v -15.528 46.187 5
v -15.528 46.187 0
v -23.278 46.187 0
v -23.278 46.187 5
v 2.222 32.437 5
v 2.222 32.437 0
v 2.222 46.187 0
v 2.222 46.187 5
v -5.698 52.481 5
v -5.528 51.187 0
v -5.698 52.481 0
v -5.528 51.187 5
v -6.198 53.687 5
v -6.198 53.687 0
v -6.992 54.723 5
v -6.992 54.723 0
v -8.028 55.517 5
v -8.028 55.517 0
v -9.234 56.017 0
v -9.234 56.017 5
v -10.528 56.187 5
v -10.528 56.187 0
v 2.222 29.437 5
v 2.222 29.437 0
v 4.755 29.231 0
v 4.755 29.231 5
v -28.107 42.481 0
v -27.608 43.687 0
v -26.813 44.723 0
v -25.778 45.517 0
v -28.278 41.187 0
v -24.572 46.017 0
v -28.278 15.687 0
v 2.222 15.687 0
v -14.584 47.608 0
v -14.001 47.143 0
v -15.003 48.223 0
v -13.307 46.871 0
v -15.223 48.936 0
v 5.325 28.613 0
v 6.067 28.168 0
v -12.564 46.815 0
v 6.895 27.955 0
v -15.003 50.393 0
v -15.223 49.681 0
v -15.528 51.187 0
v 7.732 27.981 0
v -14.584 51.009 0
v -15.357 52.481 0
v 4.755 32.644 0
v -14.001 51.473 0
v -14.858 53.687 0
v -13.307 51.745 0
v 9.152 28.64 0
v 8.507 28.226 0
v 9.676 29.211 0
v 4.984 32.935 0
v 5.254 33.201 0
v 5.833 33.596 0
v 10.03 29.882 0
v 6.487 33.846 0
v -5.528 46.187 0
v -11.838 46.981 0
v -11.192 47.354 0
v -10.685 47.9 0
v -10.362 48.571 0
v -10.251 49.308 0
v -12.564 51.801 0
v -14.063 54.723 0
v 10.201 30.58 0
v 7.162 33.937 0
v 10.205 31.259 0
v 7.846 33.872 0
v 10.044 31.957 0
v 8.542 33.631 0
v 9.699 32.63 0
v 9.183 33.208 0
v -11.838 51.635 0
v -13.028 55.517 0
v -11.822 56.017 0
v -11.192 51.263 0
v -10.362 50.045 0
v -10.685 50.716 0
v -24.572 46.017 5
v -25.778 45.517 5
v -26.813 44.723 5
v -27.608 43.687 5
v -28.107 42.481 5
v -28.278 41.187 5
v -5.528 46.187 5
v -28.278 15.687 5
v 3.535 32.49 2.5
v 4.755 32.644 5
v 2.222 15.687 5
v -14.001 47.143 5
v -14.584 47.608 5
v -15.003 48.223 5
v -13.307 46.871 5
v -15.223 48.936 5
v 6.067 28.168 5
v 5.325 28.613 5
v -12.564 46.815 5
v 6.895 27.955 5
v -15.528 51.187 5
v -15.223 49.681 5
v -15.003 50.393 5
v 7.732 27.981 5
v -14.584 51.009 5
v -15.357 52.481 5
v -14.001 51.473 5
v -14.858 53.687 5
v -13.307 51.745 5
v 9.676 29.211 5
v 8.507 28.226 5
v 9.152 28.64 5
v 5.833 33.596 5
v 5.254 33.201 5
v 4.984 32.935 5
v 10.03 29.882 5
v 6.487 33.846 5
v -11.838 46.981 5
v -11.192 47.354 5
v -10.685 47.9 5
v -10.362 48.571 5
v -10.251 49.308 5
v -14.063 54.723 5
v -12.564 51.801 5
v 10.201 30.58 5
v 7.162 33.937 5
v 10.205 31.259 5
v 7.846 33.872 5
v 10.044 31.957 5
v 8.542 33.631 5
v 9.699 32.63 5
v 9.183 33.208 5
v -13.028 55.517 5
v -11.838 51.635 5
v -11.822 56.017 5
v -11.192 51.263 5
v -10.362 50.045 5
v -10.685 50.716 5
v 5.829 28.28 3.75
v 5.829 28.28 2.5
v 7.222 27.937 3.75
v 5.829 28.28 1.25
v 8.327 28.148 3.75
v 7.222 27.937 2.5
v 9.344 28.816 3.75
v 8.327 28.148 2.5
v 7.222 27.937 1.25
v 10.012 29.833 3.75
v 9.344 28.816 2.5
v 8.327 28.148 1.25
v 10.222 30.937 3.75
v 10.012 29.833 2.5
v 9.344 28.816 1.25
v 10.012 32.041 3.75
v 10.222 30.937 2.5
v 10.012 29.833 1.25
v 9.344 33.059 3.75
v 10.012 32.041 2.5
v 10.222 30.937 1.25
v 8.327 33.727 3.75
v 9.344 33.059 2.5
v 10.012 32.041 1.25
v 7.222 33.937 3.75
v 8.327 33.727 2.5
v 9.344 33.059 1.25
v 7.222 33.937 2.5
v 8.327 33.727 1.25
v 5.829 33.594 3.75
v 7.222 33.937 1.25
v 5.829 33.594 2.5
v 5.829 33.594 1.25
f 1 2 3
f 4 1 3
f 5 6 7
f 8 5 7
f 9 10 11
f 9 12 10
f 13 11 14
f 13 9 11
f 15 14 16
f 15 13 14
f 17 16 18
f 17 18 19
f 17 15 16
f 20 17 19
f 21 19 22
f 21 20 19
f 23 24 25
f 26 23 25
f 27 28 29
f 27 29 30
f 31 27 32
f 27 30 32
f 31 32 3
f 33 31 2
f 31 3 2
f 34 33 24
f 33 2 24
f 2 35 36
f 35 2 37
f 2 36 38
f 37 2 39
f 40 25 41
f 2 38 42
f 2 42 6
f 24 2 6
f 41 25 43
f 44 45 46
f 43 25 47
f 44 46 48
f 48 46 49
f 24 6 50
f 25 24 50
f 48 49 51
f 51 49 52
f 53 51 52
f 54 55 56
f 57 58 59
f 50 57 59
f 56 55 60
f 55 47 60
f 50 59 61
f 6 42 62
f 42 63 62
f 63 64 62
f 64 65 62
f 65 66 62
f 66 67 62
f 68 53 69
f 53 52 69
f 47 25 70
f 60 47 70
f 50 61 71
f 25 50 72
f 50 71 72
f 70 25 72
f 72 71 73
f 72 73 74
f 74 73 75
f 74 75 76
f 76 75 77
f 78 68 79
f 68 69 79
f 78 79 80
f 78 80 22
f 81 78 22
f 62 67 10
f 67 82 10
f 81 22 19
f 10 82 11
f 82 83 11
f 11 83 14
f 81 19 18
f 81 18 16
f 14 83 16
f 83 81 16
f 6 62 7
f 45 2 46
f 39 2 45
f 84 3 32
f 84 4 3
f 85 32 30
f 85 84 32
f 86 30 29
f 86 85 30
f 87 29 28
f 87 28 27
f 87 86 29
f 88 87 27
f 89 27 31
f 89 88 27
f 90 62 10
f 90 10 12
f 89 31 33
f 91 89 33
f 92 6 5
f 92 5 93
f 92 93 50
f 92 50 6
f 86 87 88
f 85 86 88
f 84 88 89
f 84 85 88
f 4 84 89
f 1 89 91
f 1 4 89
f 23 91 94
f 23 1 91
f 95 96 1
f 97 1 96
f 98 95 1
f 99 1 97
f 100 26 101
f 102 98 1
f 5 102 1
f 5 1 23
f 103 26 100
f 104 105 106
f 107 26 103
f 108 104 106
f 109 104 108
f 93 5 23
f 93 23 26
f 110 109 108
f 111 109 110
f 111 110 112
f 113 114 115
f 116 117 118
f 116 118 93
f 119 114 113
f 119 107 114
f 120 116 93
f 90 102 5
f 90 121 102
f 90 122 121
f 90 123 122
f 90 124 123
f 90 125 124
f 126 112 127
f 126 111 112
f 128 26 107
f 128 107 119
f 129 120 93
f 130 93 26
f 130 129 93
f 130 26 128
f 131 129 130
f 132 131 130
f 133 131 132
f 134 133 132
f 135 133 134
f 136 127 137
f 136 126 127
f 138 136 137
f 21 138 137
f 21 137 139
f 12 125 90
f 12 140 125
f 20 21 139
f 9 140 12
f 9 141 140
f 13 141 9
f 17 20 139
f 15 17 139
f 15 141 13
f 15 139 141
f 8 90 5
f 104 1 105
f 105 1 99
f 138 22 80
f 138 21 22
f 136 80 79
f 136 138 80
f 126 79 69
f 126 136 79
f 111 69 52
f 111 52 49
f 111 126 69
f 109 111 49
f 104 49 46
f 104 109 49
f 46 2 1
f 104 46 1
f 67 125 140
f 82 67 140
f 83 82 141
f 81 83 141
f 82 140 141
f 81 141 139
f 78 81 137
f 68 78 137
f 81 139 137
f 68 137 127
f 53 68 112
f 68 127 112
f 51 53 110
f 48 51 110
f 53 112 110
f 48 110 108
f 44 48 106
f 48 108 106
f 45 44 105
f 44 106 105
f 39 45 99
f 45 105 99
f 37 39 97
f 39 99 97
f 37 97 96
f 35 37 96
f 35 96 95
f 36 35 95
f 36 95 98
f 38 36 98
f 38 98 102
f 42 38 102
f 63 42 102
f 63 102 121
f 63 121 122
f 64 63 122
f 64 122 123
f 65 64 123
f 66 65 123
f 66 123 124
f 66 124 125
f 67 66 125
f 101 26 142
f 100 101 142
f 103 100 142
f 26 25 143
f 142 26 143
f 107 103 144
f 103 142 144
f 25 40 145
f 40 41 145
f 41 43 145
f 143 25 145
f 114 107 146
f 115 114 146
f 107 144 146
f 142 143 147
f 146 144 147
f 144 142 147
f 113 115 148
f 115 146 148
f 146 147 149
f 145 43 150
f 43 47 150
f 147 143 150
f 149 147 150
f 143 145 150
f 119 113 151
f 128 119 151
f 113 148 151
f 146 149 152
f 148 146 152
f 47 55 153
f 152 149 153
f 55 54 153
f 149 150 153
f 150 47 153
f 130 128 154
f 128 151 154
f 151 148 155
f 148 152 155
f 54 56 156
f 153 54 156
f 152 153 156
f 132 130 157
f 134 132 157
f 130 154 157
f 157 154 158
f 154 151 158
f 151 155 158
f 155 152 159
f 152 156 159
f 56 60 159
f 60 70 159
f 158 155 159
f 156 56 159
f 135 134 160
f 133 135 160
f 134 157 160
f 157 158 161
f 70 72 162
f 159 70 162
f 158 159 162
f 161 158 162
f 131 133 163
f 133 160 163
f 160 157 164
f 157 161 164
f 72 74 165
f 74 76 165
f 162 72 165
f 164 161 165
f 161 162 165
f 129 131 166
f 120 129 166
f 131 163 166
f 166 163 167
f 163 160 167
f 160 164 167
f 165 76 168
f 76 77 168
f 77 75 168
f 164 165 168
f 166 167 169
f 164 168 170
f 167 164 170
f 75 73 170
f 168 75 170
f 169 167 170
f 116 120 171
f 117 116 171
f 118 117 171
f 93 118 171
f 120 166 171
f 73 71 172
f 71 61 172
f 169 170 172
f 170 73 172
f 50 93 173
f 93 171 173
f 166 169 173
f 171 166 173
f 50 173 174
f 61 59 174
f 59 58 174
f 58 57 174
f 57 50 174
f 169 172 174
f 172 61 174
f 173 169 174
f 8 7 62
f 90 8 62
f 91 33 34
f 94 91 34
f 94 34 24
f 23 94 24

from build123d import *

# Parameters (mm, degrees)
F1_DEPTH = 5
F2_R     = 5
F3_W     = 5
F3_H     = 5
F4_DEPTH = 10
F5_R     = 4.99999
F6_R     = 2.5
F7_DEPTH = 25


# Not quite as in the source:
# - a fillet or chamfer is up to 0.001 mm smaller than in the source, because OpenCascade refuses the exact size


with BuildPart() as f1:
    # F0 (on Top) → F1 (new body)
    with BuildSketch(Plane.XY):
        with BuildLine():
            Line((2.2222189992, 32.4371969399), (2.2222189992, 33.9371969399))
            Line((2.2222189992, 33.9371969399), (2.2222189992, 35.4371969399))
            add(Edge.make_bspline(
                [(2.2222189992, 35.4371969399), (-2.7777810008, 35.4371969399), (-2.7777810008, 33.9371969399), (-2.7777810008, 32.4371969399), (2.2222189992, 32.4371969399)],
                knots=[1.5707963268, 1.5707963268, 1.5707963268, 3.1415926536, 3.1415926536, 4.7123889804, 4.7123889804, 4.7123889804], degree=2, weights=[1, 0.7071067812, 1, 0.7071067812, 1]))
        make_face()
        with BuildLine():
            add(Edge.make_bspline(
                [(2.2222189992, 32.4371969399), (3.5823095151, 32.4371969399), (4.7549905191, 32.6438848513)],
                knots=[4.7123889804, 4.7123889804, 4.7123889804, 5.2435726948, 5.2435726948, 5.2435726948], degree=2, weights=[1, 0.964937319, 1]))
            Line((2.2222189992, 32.4371969399), (2.2222189992, 30.9371969399))
            Line((2.2222189992, 30.9371969399), (4.2222189992, 30.9371969399))
            add(Edge.make_bspline(
                [(4.7549905191, 32.6438848513), (4.2222189992, 31.8736977196), (4.2222189992, 30.9371969399)],
                knots=[0.9656335287, 0.9656335287, 0.9656335287, 1.5707963268, 1.5707963268, 1.5707963268], degree=2, weights=[1, 0.9545704514, 1]))
        make_face()
        with BuildLine():
            Line((2.2222189992, 30.9371969399), (2.2222189992, 32.4371969399))
            add(Edge.make_bspline(
                [(2.2222189992, 35.4371969399), (-2.7777810008, 35.4371969399), (-2.7777810008, 33.9371969399), (-2.7777810008, 32.4371969399), (2.2222189992, 32.4371969399)],
                knots=[1.5707963268, 1.5707963268, 1.5707963268, 3.1415926536, 3.1415926536, 4.7123889804, 4.7123889804, 4.7123889804], degree=2, weights=[1, 0.7071067812, 1, 0.7071067812, 1]))
            Line((2.2222189992, 35.4371969399), (2.2222189992, 46.1871969399))
            Line((2.2222189992, 46.1871969399), (-28.2777810008, 46.1871969399))
            Line((-28.2777810008, 46.1871969399), (-28.2777810008, 15.6871969399))
            Line((-28.2777810008, 15.6871969399), (2.2222189992, 15.6871969399))
            Line((2.2222189992, 15.6871969399), (2.2222189992, 26.4371969399))
            add(Edge.make_bspline(
                [(2.2222189992, 29.4371969399), (-2.7777810008, 29.4371969399), (-2.7777810008, 27.9371969399), (-2.7777810008, 26.4371969399), (2.2222189992, 26.4371969399)],
                knots=[4.7123889804, 4.7123889804, 4.7123889804, 6.2831853072, 6.2831853072, 7.853981634, 7.853981634, 7.853981634], degree=2, weights=[1, 0.7071067812, 1, 0.7071067812, 1]))
            Line((2.2222189992, 29.4371969399), (2.2222189992, 30.9371969399))
        make_face()
        with BuildLine():
            Line((4.2222189992, 30.9371969399), (2.2222189992, 30.9371969399))
            Line((2.2222189992, 30.9371969399), (2.2222189992, 29.4371969399))
            add(Edge.make_bspline(
                [(4.7549905191, 29.2305090285), (3.5823095151, 29.4371969399), (2.2222189992, 29.4371969399)],
                knots=[4.181205266, 4.181205266, 4.181205266, 4.7123889804, 4.7123889804, 4.7123889804], degree=2, weights=[1, 0.964937319, 1]))
            add(Edge.make_bspline(
                [(4.2222189992, 30.9371969399), (4.2222189992, 30.0006961603), (4.7549905191, 29.2305090285)],
                knots=[1.5707963268, 1.5707963268, 1.5707963268, 2.1759591249, 2.1759591249, 2.1759591249], degree=2, weights=[1, 0.9545704514, 1]))
        make_face()
        with BuildLine():
            add(Edge.make_bspline(
                [(7.2222189992, 33.9371969399), (5.6496300407, 33.9371969399), (4.7549905191, 32.6438848513)],
                knots=[0, 0, 0, 0.9656335287, 0.9656335287, 0.9656335287], degree=2, weights=[1, 0.8856906826, 1]))
            add(Edge.make_bspline(
                [(4.7549905191, 32.6438848513), (7.2222189992, 33.0787399396), (7.2222189992, 33.9371969399)],
                knots=[5.2435726948, 5.2435726948, 5.2435726948, 6.2831853072, 6.2831853072, 6.2831853072], degree=2, weights=[1, 0.867915406, 1]))
        make_face()
        with BuildLine():
            add(Edge.make_bspline(
                [(4.7549905191, 32.6438848513), (7.2222189992, 33.0787399396), (7.2222189992, 33.9371969399)],
                knots=[5.2435726948, 5.2435726948, 5.2435726948, 6.2831853072, 6.2831853072, 6.2831853072], degree=2, weights=[1, 0.867915406, 1]))
            add(Edge.make_bspline(
                [(4.7549905191, 32.6438848513), (4.2222189992, 31.8736977196), (4.2222189992, 30.9371969399)],
                knots=[0.9656335287, 0.9656335287, 0.9656335287, 1.5707963268, 1.5707963268, 1.5707963268], degree=2, weights=[1, 0.9545704514, 1]))
            Line((4.2222189992, 30.9371969399), (7.2222189992, 30.9371969399))
            Line((7.2222189992, 30.9371969399), (7.2222189992, 33.9371969399))
        make_face()
        with BuildLine():
            add(Edge.make_bspline(
                [(7.2222189992, 27.9371969399), (10.2222189992, 27.9371969399), (10.2222189992, 30.9371969399), (10.2222189992, 33.9371969399), (7.2222189992, 33.9371969399)],
                knots=[3.1415926536, 3.1415926536, 3.1415926536, 4.7123889804, 4.7123889804, 6.2831853072, 6.2831853072, 6.2831853072], degree=2, weights=[1, 0.7071067812, 1, 0.7071067812, 1]))
            Line((7.2222189992, 33.9371969399), (7.2222189992, 30.9371969399))
            Line((7.2222189992, 30.9371969399), (7.2222189992, 27.9371969399))
        make_face()
        with BuildLine():
            Line((2.2222189992, 27.9371969399), (2.2222189992, 29.4371969399))
            add(Edge.make_bspline(
                [(2.2222189992, 29.4371969399), (-2.7777810008, 29.4371969399), (-2.7777810008, 27.9371969399), (-2.7777810008, 26.4371969399), (2.2222189992, 26.4371969399)],
                knots=[4.7123889804, 4.7123889804, 4.7123889804, 6.2831853072, 6.2831853072, 7.853981634, 7.853981634, 7.853981634], degree=2, weights=[1, 0.7071067812, 1, 0.7071067812, 1]))
            Line((2.2222189992, 26.4371969399), (2.2222189992, 27.9371969399))
        make_face()
        with BuildLine():
            Line((7.2222189992, 30.9371969399), (4.2222189992, 30.9371969399))
            add(Edge.make_bspline(
                [(4.2222189992, 30.9371969399), (4.2222189992, 30.0006961603), (4.7549905191, 29.2305090285)],
                knots=[1.5707963268, 1.5707963268, 1.5707963268, 2.1759591249, 2.1759591249, 2.1759591249], degree=2, weights=[1, 0.9545704514, 1]))
            add(Edge.make_bspline(
                [(7.2222189992, 27.9371969399), (7.2222189992, 28.7956539402), (4.7549905191, 29.2305090285)],
                knots=[3.1415926536, 3.1415926536, 3.1415926536, 4.181205266, 4.181205266, 4.181205266], degree=2, weights=[1, 0.867915406, 1]))
            Line((7.2222189992, 27.9371969399), (7.2222189992, 30.9371969399))
        make_face()
        with BuildLine():
            add(Edge.make_bspline(
                [(4.7549905191, 29.2305090285), (5.6496300407, 27.9371969399), (7.2222189992, 27.9371969399)],
                knots=[2.1759591249, 2.1759591249, 2.1759591249, 3.1415926536, 3.1415926536, 3.1415926536], degree=2, weights=[1, 0.8856906826, 1]))
            add(Edge.make_bspline(
                [(7.2222189992, 27.9371969399), (7.2222189992, 28.7956539402), (4.7549905191, 29.2305090285)],
                knots=[3.1415926536, 3.1415926536, 3.1415926536, 4.181205266, 4.181205266, 4.181205266], degree=2, weights=[1, 0.867915406, 1]))
        make_face()
    extrude(amount=F1_DEPTH)

    # F2
    f2_edges = [f1.edges().sort_by_distance(p)[0] for p in [
        (-28.277781, 46.187197, 2.5),
    ]]
    fillet(f2_edges, radius=F2_R)

    # F3 (on face) → F4 (join)
    with BuildSketch(Plane(origin=(0, 46.1871969399, 0), x_dir=(-1, 0, 0), z_dir=(0, 1, 0))):
        with Locations((13.0277810008, 2.5)):
            Rectangle(F3_W, F3_H)
        with Locations((8.0277810008, 2.5)):
            Rectangle(F3_W, F3_H)
    extrude(amount=F4_DEPTH)

    # F5 (radius 5 in the source; OpenCascade refuses exactly that, so slightly less here)
    f5_edges = [f1.edges().sort_by_distance(p)[0] for p in [
        (-15.527781, 56.187197, 2.5),
        (-5.527781, 56.187197, 2.5),
    ]]
    fillet(f5_edges, radius=F5_R)

    # F6 (on face) → F7 (cut)
    with BuildSketch(Plane.XY.offset(5)):
        with Locations((-12.7509618178, 49.3081174791)):
            Circle(F6_R)
    extrude(amount=-F7_DEPTH, mode=Mode.SUBTRACT)


solid = f1.part
